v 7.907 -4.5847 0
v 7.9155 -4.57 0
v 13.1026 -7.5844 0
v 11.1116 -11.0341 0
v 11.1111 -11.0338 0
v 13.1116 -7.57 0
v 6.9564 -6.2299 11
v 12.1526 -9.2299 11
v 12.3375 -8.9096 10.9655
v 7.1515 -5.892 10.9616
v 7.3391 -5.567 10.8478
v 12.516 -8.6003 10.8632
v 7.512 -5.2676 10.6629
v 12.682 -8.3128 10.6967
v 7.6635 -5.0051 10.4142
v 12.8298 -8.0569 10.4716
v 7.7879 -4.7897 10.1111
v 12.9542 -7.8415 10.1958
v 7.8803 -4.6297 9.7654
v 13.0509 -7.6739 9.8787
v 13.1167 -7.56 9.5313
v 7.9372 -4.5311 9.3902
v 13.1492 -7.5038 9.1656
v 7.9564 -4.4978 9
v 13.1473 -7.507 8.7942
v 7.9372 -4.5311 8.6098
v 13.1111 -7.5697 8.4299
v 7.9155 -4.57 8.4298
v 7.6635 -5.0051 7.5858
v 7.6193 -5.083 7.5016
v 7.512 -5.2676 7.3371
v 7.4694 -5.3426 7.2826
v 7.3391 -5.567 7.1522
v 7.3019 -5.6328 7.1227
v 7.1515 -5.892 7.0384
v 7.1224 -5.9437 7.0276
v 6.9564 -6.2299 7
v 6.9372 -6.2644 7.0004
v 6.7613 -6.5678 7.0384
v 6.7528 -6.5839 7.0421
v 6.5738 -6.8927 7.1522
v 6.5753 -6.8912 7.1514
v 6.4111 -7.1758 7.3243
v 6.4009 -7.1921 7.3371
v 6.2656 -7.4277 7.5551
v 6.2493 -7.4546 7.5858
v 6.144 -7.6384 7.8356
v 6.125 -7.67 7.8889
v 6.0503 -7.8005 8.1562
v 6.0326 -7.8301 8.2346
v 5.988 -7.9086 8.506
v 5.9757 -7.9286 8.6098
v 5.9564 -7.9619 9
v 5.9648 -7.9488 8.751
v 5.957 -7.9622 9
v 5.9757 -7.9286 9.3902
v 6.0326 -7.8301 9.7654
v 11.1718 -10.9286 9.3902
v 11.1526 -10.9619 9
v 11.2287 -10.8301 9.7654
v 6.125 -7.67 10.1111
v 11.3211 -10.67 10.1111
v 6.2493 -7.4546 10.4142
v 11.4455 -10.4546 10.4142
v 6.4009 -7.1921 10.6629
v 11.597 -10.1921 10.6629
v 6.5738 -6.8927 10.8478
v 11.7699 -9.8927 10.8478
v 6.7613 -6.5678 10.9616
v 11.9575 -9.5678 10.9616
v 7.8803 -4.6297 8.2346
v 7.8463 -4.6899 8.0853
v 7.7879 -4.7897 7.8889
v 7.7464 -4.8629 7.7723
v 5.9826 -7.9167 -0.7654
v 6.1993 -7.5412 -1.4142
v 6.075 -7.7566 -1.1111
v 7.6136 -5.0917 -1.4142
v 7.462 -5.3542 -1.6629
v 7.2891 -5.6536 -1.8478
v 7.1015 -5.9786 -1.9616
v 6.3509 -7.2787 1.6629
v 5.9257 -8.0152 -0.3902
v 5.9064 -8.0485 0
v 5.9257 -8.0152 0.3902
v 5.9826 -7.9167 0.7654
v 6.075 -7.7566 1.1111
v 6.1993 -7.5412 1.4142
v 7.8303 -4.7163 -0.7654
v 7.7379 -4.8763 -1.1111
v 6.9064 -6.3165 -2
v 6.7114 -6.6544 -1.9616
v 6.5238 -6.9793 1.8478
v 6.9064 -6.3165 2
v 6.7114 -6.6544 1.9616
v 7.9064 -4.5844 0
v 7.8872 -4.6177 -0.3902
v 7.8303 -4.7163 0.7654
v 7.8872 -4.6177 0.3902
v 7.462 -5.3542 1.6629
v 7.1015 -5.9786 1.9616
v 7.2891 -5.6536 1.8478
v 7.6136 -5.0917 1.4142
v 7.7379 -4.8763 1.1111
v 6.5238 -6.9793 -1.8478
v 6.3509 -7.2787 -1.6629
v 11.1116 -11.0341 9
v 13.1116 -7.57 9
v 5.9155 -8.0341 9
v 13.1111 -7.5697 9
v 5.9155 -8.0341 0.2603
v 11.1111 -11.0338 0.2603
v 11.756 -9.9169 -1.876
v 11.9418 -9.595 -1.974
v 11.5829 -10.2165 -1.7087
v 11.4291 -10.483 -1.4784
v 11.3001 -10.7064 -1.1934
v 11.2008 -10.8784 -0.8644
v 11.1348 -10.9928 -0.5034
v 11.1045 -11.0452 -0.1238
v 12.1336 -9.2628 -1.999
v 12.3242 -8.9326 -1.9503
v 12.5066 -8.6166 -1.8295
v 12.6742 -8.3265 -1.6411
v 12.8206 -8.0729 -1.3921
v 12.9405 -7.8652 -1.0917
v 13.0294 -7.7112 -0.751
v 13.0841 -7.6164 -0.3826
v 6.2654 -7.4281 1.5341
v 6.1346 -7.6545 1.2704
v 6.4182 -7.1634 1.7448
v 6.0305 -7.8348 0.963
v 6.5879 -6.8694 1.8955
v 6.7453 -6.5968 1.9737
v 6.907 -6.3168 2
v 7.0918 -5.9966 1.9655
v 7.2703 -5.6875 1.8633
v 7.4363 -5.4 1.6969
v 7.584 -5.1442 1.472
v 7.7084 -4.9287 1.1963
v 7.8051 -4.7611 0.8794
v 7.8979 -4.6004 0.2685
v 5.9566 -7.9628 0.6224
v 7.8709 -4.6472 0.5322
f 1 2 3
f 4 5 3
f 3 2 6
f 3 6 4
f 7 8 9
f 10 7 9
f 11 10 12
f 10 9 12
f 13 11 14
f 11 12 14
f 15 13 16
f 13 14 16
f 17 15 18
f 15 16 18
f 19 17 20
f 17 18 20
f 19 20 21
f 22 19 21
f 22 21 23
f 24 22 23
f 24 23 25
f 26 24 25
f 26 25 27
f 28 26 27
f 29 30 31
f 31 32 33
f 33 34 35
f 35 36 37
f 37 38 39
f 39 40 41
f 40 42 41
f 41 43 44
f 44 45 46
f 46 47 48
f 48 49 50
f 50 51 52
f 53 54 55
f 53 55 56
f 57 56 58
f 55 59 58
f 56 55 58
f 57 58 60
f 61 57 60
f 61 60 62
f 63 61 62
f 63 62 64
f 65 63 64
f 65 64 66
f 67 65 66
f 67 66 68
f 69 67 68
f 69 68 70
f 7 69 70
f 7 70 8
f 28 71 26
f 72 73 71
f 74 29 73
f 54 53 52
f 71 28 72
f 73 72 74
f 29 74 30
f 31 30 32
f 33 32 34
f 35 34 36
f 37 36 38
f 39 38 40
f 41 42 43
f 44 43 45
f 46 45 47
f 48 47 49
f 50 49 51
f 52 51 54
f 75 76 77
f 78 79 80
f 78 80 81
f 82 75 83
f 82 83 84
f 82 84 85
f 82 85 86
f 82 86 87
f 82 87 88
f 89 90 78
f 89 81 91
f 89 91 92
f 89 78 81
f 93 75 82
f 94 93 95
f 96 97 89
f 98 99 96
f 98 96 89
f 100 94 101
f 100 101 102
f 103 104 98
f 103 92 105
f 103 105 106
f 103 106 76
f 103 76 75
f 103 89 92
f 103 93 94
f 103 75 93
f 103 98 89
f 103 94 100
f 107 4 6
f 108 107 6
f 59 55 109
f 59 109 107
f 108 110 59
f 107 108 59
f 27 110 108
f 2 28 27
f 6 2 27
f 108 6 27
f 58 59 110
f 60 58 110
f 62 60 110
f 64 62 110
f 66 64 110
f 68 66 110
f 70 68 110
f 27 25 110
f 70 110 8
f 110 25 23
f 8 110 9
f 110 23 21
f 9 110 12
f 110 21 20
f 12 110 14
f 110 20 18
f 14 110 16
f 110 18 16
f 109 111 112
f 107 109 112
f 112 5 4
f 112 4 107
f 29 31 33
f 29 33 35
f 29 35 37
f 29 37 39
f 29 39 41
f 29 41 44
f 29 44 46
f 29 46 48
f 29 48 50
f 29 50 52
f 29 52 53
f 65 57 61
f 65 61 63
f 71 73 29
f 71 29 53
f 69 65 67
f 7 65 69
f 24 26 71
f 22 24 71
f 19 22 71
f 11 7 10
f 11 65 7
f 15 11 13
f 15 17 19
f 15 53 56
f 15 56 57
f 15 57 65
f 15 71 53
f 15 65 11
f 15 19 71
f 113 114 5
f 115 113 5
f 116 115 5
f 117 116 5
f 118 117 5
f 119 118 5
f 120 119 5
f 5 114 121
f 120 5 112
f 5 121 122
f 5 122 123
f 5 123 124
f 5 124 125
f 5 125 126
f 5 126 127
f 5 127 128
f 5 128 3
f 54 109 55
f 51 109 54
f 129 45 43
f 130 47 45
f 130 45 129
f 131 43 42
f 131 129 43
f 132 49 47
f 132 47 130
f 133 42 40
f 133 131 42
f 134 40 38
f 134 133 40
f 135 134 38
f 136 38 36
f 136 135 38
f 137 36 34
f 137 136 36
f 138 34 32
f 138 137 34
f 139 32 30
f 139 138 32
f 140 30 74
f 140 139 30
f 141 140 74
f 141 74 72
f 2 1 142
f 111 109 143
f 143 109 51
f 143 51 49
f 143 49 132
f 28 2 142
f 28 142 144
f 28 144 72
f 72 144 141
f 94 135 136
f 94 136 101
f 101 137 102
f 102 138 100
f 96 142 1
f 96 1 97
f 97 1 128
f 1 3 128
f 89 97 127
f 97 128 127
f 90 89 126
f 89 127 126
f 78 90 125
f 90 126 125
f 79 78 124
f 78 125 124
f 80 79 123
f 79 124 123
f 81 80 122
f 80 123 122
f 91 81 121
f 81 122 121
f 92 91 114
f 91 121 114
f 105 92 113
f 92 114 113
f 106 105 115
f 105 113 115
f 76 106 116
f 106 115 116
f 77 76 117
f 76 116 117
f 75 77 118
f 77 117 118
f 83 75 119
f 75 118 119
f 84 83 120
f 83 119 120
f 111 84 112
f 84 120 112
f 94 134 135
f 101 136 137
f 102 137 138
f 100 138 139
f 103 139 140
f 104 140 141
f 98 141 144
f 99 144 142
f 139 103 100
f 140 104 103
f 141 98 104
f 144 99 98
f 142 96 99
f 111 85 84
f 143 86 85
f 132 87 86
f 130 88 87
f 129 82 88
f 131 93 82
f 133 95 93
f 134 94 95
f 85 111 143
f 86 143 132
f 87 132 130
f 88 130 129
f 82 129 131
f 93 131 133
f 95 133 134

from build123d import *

# Parameters (mm, degrees)
CYLINDER006_R               = 2
CYLINDER006_DEPTH           = 6
CYLINDER006_PITCH_ANGLE     = -90
CYLINDER006_PLACEMENT_ANGLE = -30.000033
CYLINDER007_R               = 2
CYLINDER007_DEPTH           = 6
CYLINDER007_PITCH_ANGLE     = -90
CYLINDER007_PLACEMENT_ANGLE = -30.000033
BOX012_W                    = 6
BOX012_H                    = 4
BOX012_DEPTH                = 9
BOX012_PLACEMENT_ANGLE      = 30


with BuildPart() as cylinder006:
    # Cylinder006 → Cylinder006 (new body)
    with BuildSketch(Plane.XY):
        Circle(CYLINDER006_R)
    extrude(amount=CYLINDER006_DEPTH)


with BuildPart() as cylinder006_1:
    # Cylinder006 pitch: moved
    add(cylinder006.part.rotate(Axis((0, 0, 0), (0, 1, 0)), CYLINDER006_PITCH_ANGLE))


with BuildPart() as cylinder006_2:
    # Cylinder006 placement: moved
    add(cylinder006_1.part.moved(Location((12.102594, -9.316468, -1e-06))).rotate(Axis((12.102594, -9.316468, -1e-06), (0, 0, 1)), CYLINDER006_PLACEMENT_ANGLE))


with BuildPart() as cylinder007:
    # Cylinder007 → Cylinder007 (new body)
    with BuildSketch(Plane.XY):
        Circle(CYLINDER007_R)
    extrude(amount=CYLINDER007_DEPTH)


with BuildPart() as cylinder007_1:
    # Cylinder007 pitch: moved
    add(cylinder007.part.rotate(Axis((0, 0, 0), (0, 1, 0)), CYLINDER007_PITCH_ANGLE))


with BuildPart() as cylinder007_2:
    # Cylinder007 placement: moved
    add(cylinder007_1.part.moved(Location((12.15259, -9.229864, 8.999999))).rotate(Axis((12.15259, -9.229864, 8.999999), (0, 0, 1)), CYLINDER007_PLACEMENT_ANGLE))


with BuildPart() as fusion011:
    # Box012 → Box012 (new body)
    with BuildSketch(Plane.XY):
        with Locations((3, 2)):
            Rectangle(BOX012_W, BOX012_H)
    extrude(amount=BOX012_DEPTH)


with BuildPart() as fusion011_1:
    # Box012 placement: moved
    add(fusion011.part.moved(Location((5.915496, -8.034102, 0))).rotate(Axis((5.915496, -8.034102, 0), (0, 0, -1)), BOX012_PLACEMENT_ANGLE))

    # Fusion011: union Cylinder006, Cylinder007
    add(cylinder006_2.part)
    add(cylinder007_2.part)


solid = fusion011_1.part
